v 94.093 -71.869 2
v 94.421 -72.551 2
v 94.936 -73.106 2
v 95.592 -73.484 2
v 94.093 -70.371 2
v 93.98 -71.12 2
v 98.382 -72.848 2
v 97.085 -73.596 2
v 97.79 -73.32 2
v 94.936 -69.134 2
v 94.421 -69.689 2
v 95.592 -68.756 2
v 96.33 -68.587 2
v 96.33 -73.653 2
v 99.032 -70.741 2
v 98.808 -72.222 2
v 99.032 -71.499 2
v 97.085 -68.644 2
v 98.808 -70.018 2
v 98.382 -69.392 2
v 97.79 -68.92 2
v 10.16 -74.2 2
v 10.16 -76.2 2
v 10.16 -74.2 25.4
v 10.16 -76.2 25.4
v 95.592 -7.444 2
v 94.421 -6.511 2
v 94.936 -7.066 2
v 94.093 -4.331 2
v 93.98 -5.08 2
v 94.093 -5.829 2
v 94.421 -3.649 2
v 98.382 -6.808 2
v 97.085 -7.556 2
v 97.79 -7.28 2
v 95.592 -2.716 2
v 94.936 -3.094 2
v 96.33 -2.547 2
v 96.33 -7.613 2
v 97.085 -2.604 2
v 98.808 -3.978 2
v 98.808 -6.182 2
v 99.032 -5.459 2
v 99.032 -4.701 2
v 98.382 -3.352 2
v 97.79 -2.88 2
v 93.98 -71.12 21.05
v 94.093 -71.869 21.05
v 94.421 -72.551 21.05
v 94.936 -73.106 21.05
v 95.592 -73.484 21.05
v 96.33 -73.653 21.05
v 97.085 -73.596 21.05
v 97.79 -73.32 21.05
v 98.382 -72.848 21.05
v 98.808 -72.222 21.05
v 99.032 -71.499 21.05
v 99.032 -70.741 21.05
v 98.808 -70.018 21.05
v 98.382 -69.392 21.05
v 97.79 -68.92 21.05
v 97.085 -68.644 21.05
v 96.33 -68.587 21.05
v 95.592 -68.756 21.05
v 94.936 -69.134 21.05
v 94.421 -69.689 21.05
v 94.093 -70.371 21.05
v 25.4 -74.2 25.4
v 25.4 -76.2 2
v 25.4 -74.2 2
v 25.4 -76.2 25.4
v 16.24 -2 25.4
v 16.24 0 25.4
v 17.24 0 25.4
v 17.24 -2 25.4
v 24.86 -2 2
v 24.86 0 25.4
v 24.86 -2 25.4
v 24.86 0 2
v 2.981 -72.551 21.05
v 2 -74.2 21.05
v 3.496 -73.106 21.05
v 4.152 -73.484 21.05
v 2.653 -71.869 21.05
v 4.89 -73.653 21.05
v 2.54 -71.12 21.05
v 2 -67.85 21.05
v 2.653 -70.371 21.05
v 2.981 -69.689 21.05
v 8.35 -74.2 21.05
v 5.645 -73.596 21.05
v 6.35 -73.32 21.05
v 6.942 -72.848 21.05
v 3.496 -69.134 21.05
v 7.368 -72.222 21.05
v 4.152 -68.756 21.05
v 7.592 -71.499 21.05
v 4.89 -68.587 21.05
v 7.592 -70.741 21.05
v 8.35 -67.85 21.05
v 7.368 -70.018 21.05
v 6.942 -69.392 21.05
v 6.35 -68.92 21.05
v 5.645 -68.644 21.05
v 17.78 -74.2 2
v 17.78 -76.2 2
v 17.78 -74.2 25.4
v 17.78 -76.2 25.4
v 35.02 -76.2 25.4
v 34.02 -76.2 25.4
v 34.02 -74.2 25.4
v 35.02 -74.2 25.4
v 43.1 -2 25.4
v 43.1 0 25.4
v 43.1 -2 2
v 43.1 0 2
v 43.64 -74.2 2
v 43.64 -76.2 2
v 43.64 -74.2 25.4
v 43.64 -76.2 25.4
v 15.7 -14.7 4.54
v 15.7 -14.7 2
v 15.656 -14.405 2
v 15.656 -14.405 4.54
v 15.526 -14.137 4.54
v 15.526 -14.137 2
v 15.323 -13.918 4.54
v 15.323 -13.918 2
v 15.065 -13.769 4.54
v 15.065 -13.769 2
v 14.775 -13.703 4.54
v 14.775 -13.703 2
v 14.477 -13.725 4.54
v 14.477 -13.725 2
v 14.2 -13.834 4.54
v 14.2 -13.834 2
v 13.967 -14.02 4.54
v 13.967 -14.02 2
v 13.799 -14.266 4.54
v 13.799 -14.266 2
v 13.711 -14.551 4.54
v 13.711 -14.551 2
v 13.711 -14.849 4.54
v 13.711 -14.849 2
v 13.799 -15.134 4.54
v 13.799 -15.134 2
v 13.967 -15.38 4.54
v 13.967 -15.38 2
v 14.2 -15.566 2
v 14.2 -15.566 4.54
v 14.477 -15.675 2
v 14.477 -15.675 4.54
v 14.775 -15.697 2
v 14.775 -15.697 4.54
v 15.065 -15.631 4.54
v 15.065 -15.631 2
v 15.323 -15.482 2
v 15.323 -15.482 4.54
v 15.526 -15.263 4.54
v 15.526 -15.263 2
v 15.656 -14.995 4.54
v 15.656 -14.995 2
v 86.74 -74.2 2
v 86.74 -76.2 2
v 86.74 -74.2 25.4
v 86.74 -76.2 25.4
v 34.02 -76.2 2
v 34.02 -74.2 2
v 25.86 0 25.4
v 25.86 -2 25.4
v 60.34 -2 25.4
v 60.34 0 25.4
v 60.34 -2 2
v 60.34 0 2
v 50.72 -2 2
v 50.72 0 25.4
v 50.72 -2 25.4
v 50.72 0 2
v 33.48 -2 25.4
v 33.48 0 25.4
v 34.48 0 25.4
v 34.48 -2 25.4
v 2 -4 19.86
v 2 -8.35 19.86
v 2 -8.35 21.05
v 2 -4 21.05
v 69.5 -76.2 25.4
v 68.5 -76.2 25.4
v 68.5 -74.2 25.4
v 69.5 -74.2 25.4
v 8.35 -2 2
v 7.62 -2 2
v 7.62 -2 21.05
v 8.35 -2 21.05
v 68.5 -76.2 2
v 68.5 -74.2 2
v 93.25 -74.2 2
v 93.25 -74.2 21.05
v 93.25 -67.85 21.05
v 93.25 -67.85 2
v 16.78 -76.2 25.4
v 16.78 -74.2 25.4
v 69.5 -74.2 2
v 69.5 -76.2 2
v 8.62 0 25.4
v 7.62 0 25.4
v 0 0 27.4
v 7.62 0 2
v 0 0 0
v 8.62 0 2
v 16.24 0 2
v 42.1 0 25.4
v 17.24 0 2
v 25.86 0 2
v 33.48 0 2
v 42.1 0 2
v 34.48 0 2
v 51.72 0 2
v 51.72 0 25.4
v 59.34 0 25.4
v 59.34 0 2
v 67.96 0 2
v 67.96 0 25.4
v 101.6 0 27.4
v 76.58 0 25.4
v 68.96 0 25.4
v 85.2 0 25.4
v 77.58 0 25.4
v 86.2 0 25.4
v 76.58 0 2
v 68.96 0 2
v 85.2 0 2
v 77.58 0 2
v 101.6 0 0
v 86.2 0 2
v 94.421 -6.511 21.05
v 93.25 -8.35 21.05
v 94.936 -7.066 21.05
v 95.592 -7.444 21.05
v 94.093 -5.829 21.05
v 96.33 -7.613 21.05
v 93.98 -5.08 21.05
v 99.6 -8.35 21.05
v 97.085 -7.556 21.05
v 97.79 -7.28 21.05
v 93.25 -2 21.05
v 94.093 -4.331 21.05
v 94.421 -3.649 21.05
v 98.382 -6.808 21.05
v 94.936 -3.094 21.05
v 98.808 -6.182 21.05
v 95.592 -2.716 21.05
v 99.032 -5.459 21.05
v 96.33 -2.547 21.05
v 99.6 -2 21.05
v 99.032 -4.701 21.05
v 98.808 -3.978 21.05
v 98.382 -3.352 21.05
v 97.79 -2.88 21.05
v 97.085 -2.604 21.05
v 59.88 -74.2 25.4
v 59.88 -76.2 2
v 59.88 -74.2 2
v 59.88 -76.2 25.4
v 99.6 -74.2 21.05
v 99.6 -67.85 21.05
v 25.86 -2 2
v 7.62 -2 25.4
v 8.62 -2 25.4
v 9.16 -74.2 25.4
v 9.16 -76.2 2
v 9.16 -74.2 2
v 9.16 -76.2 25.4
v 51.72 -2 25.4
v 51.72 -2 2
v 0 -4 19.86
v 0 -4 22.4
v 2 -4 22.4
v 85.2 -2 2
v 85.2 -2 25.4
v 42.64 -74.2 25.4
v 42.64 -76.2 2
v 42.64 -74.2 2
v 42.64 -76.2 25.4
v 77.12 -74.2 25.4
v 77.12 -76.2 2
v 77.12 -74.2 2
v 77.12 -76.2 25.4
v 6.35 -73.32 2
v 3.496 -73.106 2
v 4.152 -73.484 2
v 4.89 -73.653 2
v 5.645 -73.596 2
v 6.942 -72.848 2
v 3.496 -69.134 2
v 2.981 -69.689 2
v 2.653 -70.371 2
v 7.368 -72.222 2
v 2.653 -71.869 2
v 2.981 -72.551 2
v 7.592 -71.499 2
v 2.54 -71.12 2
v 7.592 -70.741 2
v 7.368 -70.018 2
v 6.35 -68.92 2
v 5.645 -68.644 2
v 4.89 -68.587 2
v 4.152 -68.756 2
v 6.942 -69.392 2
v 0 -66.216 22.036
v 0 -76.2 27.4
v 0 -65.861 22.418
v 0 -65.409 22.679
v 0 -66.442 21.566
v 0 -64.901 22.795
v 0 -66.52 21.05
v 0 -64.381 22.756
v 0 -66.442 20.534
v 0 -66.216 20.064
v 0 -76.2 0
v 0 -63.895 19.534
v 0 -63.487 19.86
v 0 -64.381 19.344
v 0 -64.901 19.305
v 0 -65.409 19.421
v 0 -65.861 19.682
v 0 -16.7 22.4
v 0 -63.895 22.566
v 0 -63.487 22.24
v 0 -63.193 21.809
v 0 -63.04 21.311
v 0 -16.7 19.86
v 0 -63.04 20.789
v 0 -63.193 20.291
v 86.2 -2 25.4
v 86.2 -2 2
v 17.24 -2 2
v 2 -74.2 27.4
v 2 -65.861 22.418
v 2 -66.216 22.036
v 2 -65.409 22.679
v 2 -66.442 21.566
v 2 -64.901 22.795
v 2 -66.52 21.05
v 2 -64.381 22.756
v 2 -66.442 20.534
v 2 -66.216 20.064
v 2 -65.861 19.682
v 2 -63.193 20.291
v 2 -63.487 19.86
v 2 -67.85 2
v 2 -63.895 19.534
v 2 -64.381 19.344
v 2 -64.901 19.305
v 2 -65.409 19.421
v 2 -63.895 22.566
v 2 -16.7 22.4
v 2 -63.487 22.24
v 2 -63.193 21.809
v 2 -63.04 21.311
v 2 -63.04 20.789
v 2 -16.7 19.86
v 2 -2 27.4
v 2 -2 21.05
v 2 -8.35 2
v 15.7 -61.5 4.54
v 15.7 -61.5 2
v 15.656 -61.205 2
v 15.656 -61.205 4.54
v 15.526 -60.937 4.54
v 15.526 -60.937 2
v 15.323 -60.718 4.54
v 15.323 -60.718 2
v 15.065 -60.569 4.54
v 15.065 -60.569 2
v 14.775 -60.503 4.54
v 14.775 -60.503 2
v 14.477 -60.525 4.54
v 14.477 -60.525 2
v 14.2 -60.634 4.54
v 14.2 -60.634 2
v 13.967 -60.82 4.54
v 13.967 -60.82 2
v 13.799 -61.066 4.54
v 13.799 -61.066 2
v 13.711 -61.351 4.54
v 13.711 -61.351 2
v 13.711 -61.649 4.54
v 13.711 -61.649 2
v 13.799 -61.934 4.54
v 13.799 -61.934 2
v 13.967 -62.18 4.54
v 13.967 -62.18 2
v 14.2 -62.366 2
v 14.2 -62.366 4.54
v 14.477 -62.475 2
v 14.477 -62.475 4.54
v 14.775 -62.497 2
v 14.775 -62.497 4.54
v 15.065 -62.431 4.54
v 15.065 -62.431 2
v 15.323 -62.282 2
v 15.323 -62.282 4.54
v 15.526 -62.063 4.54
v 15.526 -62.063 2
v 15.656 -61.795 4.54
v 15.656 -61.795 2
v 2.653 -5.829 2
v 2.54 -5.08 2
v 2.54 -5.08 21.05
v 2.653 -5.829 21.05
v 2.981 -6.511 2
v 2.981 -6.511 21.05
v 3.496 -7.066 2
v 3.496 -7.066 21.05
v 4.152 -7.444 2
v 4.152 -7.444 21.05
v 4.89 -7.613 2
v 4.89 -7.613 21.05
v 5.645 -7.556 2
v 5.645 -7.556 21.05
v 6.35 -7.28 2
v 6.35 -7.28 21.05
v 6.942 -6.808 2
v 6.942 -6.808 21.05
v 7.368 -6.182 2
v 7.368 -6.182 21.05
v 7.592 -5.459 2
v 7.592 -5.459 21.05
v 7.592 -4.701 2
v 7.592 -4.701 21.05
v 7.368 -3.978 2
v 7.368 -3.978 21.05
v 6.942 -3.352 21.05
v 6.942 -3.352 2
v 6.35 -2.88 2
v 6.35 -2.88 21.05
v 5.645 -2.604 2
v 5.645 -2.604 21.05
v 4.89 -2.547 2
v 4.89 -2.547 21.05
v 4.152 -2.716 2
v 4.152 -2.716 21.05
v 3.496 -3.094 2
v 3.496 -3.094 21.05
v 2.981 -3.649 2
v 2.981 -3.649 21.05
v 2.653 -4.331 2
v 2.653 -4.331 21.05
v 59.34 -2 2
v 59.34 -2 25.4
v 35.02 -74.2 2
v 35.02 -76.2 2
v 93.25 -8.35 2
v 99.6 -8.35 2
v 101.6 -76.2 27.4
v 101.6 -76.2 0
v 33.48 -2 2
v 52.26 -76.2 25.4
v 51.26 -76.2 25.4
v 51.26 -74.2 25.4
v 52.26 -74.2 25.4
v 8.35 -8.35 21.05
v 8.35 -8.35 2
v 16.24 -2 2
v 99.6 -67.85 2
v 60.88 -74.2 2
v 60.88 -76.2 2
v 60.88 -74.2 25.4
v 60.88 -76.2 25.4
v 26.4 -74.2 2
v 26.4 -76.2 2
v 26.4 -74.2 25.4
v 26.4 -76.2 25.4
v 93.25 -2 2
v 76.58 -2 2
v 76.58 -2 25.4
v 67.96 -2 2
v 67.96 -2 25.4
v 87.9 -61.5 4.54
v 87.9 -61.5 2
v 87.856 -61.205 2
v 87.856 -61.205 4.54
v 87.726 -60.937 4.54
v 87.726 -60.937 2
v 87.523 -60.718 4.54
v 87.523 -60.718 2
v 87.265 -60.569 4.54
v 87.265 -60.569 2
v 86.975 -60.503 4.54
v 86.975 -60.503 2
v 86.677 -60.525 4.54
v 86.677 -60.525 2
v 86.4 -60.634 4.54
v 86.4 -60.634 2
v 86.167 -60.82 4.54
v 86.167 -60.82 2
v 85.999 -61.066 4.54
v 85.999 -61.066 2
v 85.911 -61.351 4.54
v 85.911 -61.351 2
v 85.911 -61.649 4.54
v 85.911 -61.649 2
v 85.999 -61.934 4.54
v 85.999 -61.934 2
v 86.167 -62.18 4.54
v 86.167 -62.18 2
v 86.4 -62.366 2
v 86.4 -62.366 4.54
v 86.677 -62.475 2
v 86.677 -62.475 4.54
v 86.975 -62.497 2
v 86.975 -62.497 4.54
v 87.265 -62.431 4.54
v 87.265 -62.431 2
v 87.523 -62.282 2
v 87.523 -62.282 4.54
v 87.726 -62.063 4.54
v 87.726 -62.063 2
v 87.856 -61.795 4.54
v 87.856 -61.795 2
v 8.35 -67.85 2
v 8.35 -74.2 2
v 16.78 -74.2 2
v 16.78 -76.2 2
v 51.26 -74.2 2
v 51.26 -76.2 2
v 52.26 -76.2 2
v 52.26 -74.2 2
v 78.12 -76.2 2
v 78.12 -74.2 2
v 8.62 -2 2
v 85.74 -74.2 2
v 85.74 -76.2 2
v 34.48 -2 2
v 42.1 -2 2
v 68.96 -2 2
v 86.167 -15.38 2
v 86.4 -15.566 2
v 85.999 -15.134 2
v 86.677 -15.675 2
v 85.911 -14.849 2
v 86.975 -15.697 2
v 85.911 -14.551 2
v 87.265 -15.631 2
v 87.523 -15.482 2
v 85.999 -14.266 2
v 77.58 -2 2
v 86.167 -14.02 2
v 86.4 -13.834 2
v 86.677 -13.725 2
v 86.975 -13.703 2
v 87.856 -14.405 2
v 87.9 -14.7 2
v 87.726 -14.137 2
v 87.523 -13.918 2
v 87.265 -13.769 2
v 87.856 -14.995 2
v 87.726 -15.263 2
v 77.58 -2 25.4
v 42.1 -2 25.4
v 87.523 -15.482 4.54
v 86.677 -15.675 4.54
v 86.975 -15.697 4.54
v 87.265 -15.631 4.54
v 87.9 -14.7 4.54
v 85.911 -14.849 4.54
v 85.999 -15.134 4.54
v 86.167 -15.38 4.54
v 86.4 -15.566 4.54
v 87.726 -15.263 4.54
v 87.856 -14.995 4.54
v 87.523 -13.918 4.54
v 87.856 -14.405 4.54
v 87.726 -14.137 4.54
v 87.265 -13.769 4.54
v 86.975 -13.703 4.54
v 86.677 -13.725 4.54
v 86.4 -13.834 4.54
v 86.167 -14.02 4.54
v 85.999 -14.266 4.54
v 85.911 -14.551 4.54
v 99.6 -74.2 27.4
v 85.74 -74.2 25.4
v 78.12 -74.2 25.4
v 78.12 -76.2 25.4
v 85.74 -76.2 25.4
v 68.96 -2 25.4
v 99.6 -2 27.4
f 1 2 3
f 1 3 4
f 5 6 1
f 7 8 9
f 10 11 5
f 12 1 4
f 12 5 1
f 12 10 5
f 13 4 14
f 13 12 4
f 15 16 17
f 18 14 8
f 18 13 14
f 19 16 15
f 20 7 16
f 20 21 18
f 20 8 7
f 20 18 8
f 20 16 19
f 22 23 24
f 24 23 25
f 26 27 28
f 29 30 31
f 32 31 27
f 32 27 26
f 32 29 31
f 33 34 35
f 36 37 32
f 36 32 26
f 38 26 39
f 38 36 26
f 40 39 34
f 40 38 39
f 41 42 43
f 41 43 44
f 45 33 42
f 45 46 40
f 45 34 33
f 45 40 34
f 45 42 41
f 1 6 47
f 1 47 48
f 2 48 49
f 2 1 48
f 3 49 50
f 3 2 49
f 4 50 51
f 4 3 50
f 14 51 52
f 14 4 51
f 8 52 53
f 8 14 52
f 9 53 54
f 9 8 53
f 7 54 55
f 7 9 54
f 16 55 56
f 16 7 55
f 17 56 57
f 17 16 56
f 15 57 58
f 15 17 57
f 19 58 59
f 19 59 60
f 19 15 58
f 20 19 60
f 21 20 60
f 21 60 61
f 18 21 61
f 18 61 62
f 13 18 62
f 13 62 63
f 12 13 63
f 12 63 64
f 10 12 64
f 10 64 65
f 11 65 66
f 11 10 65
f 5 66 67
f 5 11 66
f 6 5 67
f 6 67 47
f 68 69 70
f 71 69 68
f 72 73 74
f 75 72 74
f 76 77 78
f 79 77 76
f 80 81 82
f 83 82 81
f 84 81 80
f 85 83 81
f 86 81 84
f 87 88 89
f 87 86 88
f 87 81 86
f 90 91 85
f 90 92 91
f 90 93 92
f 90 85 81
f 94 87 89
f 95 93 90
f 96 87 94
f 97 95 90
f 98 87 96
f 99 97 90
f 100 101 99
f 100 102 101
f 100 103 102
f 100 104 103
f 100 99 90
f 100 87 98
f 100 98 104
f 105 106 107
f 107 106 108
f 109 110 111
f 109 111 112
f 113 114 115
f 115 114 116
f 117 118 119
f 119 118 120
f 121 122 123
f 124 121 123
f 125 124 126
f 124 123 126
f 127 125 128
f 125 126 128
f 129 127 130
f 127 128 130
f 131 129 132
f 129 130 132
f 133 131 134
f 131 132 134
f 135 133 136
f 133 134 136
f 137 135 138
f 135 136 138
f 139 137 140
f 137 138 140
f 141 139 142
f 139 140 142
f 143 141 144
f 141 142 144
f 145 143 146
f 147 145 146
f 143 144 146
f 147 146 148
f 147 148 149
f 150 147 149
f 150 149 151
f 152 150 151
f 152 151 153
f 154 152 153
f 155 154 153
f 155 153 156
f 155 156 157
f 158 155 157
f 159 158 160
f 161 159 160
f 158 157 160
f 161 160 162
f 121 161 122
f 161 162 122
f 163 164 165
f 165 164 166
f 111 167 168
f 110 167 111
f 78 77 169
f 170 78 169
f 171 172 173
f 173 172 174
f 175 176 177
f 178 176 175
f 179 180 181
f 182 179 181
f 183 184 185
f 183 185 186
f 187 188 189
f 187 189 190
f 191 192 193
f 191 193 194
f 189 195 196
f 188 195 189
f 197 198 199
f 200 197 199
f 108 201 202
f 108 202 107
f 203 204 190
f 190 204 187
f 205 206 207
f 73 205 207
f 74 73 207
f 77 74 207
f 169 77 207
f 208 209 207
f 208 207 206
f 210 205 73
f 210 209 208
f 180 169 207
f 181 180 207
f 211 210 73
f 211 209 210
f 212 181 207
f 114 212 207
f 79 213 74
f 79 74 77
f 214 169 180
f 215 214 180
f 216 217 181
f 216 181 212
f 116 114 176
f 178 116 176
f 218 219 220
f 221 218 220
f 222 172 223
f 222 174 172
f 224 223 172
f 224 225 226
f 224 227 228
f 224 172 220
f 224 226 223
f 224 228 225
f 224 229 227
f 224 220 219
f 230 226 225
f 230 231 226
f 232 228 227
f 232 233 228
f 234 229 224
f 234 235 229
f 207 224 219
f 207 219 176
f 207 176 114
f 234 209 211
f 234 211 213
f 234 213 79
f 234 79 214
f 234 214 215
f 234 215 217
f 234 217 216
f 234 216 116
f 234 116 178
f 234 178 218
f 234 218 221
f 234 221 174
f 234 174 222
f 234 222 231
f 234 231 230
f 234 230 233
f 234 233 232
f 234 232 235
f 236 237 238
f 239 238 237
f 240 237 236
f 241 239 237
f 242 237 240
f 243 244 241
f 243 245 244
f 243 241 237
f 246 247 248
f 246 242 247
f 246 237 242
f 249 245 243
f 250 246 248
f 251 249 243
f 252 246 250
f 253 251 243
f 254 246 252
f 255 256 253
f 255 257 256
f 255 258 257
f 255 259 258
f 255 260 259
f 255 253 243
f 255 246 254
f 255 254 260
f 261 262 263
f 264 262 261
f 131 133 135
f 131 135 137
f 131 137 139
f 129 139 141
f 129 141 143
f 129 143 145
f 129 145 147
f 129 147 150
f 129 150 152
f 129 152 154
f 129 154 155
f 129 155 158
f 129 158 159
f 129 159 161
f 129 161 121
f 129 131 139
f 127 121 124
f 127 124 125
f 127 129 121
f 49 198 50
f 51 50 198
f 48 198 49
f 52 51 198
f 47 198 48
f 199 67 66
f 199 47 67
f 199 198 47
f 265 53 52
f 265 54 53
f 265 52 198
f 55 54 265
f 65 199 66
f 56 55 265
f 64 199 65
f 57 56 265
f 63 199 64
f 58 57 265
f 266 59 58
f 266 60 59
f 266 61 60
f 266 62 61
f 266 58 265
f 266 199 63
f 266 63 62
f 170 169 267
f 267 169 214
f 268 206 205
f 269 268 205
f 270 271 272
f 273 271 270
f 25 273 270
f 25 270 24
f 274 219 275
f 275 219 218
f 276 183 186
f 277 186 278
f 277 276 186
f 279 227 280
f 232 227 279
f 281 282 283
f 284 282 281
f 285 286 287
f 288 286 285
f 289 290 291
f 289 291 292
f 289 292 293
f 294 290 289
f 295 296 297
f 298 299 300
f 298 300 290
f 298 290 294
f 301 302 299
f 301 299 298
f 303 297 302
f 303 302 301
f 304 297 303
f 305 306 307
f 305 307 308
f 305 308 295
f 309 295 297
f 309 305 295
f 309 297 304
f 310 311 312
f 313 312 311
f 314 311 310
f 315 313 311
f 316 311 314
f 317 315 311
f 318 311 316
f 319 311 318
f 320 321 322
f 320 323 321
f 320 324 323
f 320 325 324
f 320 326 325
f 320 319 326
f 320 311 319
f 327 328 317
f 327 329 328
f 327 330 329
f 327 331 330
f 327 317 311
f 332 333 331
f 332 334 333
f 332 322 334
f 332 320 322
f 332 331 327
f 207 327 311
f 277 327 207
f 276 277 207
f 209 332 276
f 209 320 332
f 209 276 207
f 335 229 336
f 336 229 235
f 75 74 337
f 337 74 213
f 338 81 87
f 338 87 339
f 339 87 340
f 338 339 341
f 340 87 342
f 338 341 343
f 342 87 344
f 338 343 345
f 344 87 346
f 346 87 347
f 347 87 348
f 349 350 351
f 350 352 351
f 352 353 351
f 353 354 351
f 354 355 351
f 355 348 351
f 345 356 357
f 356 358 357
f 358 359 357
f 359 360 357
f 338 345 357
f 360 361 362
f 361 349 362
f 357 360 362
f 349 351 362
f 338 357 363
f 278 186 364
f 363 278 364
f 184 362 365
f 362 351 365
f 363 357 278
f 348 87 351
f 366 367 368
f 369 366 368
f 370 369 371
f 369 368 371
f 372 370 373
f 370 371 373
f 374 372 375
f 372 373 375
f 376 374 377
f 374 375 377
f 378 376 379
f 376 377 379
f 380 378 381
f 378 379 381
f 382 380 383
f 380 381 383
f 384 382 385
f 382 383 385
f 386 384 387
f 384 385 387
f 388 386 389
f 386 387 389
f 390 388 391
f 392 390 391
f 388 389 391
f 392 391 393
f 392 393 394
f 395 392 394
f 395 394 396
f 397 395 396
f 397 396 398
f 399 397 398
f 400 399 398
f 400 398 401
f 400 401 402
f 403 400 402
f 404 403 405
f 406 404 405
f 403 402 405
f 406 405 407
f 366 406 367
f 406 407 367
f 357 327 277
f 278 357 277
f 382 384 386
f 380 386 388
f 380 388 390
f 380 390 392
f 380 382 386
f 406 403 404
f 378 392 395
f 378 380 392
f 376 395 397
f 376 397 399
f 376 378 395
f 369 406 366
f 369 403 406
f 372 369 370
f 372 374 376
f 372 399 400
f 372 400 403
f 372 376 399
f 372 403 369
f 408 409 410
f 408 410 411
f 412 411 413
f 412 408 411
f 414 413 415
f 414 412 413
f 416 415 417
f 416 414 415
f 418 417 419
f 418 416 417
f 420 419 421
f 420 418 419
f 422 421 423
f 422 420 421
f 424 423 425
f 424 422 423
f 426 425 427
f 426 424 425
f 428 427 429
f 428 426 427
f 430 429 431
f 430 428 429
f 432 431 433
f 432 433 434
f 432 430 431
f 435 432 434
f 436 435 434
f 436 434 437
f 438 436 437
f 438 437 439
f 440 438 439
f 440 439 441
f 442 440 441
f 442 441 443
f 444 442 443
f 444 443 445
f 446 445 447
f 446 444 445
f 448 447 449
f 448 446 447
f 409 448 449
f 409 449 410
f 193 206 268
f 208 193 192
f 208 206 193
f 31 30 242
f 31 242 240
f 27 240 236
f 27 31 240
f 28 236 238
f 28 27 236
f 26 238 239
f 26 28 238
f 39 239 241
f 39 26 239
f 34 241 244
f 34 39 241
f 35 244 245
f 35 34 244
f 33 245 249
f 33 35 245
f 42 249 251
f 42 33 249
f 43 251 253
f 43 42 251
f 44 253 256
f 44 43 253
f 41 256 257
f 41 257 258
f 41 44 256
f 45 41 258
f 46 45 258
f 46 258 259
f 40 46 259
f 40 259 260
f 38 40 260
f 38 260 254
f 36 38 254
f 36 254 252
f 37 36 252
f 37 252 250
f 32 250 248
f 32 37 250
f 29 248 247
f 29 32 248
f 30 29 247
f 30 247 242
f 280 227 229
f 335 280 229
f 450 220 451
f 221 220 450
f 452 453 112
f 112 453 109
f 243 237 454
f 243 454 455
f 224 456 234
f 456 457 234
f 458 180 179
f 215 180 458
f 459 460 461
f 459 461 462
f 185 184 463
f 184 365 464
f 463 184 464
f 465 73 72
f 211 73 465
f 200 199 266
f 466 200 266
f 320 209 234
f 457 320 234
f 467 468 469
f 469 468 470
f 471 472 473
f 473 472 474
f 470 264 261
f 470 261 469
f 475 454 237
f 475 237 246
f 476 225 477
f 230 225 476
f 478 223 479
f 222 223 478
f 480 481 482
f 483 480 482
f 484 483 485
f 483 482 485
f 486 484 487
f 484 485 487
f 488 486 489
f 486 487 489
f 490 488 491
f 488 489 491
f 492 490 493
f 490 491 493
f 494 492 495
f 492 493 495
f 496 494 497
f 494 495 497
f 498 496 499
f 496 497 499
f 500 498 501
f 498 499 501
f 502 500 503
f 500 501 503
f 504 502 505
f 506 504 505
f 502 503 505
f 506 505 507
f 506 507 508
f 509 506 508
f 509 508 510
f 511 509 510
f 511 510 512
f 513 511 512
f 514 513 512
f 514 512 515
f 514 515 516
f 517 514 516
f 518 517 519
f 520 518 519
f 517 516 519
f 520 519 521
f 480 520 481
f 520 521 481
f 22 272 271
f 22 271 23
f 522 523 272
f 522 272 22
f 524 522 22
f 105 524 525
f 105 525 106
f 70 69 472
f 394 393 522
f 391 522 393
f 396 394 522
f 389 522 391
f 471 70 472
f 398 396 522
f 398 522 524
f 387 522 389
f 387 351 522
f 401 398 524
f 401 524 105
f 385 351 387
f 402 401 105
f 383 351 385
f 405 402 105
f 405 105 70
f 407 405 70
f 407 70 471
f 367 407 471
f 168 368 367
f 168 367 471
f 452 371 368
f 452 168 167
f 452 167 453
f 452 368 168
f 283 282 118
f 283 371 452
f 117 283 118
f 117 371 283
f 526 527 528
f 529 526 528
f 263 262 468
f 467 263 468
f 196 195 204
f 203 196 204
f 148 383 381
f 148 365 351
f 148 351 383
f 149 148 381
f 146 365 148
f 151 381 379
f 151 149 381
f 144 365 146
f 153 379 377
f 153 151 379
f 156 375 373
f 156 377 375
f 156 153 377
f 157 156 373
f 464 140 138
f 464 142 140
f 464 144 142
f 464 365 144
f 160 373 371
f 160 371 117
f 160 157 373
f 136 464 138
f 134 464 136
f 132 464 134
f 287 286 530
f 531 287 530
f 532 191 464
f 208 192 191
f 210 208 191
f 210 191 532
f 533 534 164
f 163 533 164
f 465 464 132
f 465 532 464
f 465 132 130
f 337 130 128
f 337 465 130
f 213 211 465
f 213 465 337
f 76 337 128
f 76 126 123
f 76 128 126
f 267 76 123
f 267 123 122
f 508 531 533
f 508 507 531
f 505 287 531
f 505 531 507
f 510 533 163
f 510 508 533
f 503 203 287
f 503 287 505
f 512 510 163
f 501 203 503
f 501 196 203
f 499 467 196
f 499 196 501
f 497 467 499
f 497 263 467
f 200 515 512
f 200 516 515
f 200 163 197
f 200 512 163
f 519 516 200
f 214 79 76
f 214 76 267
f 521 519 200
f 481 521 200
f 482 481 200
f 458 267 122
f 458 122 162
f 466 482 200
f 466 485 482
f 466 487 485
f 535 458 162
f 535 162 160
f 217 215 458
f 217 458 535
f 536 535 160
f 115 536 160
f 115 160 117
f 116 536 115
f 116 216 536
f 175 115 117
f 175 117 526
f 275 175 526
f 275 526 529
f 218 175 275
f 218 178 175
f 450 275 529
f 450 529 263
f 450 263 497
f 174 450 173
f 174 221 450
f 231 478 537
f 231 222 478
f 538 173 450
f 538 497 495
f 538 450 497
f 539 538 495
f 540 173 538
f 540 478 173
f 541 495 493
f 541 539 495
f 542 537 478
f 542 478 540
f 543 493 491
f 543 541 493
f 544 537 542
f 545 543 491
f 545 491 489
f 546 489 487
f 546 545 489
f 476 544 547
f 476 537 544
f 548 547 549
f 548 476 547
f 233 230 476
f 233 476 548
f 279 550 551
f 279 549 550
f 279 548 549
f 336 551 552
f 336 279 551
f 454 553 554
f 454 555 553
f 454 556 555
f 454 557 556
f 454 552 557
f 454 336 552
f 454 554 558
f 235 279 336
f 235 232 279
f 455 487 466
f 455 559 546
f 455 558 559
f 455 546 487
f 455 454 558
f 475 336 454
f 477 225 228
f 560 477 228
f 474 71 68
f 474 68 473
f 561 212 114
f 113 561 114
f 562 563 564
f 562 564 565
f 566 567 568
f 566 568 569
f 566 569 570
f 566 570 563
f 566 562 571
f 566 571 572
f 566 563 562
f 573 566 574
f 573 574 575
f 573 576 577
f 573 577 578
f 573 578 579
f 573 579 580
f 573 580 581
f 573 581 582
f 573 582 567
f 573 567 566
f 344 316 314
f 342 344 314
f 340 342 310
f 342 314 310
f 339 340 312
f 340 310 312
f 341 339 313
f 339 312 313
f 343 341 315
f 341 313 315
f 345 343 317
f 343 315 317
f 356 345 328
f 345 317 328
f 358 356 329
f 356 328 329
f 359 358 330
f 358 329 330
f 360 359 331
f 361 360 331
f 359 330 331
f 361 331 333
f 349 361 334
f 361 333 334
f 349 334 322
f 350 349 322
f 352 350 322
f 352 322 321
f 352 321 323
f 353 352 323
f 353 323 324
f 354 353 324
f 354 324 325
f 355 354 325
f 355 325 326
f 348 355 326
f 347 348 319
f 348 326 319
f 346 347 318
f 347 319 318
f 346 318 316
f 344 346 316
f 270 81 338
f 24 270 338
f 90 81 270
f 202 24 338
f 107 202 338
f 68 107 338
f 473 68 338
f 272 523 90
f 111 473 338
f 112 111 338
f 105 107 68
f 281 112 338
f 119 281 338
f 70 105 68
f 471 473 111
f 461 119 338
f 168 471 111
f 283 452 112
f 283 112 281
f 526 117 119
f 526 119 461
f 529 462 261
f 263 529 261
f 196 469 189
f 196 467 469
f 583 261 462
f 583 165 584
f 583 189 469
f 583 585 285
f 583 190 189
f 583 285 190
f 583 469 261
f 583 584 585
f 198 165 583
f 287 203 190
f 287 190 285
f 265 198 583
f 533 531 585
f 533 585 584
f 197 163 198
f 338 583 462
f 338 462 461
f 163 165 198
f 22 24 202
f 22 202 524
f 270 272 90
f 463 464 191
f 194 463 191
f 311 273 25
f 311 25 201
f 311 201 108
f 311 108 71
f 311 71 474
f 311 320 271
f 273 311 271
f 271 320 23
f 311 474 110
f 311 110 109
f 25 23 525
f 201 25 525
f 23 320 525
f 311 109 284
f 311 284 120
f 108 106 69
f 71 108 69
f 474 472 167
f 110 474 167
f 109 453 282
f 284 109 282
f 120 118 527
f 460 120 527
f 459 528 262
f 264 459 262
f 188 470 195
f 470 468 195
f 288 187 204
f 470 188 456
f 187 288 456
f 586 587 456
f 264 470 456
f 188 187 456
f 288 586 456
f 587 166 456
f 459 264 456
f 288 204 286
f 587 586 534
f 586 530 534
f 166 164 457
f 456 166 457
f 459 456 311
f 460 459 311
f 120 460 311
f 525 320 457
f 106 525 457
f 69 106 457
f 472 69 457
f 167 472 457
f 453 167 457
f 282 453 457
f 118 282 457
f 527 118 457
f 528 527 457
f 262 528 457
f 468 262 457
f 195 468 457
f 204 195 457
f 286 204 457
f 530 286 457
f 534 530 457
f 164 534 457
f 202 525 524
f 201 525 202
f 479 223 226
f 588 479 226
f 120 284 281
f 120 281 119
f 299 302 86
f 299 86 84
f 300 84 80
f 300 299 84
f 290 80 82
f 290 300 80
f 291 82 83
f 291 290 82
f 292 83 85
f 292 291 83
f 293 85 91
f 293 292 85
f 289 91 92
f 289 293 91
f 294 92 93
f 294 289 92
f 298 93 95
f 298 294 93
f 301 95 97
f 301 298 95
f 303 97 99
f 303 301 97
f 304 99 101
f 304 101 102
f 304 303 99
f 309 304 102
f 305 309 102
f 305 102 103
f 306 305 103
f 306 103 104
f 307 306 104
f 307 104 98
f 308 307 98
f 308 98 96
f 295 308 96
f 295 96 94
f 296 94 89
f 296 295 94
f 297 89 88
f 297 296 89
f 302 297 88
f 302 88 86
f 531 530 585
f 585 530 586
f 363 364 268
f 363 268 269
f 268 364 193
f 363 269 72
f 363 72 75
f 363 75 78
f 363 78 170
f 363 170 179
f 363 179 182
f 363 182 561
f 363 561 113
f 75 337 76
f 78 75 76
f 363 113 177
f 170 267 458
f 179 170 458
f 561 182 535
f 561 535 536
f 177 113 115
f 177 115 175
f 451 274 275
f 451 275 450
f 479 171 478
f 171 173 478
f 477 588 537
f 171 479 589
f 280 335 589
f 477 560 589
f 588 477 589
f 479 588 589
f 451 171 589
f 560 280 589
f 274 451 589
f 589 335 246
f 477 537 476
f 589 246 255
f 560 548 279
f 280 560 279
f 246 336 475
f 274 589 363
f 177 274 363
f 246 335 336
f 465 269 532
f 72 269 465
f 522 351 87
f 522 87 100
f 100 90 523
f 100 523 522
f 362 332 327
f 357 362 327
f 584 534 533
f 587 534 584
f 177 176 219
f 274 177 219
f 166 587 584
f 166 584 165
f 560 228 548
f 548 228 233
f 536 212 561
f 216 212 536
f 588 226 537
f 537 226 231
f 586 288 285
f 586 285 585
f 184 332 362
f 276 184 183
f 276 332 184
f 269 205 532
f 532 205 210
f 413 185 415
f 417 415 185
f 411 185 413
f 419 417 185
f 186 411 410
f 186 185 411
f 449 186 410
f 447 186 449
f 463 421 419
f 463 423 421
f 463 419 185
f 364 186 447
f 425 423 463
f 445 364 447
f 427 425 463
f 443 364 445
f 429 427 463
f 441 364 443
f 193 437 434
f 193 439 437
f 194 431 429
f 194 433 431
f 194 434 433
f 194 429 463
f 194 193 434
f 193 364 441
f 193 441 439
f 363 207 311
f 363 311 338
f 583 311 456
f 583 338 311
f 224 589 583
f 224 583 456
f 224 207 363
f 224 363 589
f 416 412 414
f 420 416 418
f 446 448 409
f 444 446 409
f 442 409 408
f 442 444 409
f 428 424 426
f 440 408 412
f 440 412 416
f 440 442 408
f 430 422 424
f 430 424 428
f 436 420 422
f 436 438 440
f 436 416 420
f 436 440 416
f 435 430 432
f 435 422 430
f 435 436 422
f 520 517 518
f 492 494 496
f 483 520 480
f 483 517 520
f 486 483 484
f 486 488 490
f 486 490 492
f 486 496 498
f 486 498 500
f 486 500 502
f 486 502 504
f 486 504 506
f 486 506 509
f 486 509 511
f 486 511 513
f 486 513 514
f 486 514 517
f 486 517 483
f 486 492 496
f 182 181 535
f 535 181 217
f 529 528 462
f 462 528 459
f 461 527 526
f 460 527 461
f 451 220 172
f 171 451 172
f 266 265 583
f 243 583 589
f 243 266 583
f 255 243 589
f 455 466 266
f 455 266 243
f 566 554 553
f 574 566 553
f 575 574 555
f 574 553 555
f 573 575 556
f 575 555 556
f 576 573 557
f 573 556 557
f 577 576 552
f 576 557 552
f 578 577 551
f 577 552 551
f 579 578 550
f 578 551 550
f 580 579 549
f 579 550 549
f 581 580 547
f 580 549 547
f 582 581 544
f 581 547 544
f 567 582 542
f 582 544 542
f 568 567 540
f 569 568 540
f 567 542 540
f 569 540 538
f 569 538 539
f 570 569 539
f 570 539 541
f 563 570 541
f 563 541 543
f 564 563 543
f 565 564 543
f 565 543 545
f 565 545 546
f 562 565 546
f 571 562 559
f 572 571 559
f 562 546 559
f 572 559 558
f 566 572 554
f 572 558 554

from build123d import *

# Parameters (mm, degrees)
SKETCH16_W          = 101.6
SKETCH16_H          = 76.2
BOSS_EXTRUDE4_DEPTH = 2
SKETCH17_W          = 101.6
SKETCH17_H          = 76.2
SKETCH17_W_2        = 97.6
SKETCH17_H_2        = 72.2
BOSS_EXTRUDE5_DEPTH = 25.4
SKETCH18_R          = 1
BOSS_EXTRUDE6_DEPTH = 2.54
SKETCH19_W          = 1
SKETCH19_H          = 23.4
CUT_EXTRUDE6_DEPTH  = 2
SKETCH20_W          = 1
SKETCH20_H          = 23.4
CUT_EXTRUDE7_DEPTH  = 2
SKETCH21_R          = 1.75
SKETCH21_W          = 2.54
SKETCH21_H          = 12.7
CUT_EXTRUDE8_DEPTH  = 2
SKETCH33_W          = 6.35
SKETCH33_H          = 6.35
SKETCH33_R          = 2.54
BOSS_EXTRUDE7_DEPTH = 19.05


with BuildPart() as part:
    # Sketch16 → Boss-Extrude4 (new body)
    with BuildSketch(Plane.XY):
        with Locations((50.8, -38.1)):
            Rectangle(SKETCH16_W, SKETCH16_H)
    extrude(amount=BOSS_EXTRUDE4_DEPTH)

    # Sketch17 → Boss-Extrude5 (add)
    with BuildSketch(Plane.XY.offset(2)):
        with Locations((50.8, -38.1)):
            Rectangle(SKETCH17_W, SKETCH17_H)
        with Locations((50.8, -38.1)):
            Rectangle(SKETCH17_W_2, SKETCH17_H_2, mode=Mode.SUBTRACT)
    extrude(amount=BOSS_EXTRUDE5_DEPTH)

    # Sketch18 → Boss-Extrude6 (add)
    with BuildSketch(Plane.XY.offset(2)):
        with Locations((14.7, -14.7)):
            Circle(SKETCH18_R)
        with Locations((86.9, -14.7)):
            Circle(SKETCH18_R)
        with Locations((86.9, -61.5)):
            Circle(SKETCH18_R)
        with Locations((14.7, -61.5)):
            Circle(SKETCH18_R)
    extrude(amount=BOSS_EXTRUDE6_DEPTH)

    # Sketch19 → Cut-Extrude6 (cut)
    with BuildSketch(Plane.XZ.offset(76.2)):
        with Locations((9.66, 13.7)):
            Rectangle(SKETCH19_W, SKETCH19_H)
        with Locations((17.28, 13.7)):
            Rectangle(SKETCH19_W, SKETCH19_H)
        with Locations((25.9, 13.7)):
            Rectangle(SKETCH19_W, SKETCH19_H)
        with Locations((34.52, 13.7)):
            Rectangle(SKETCH19_W, SKETCH19_H)
        with Locations((43.14, 13.7)):
            Rectangle(SKETCH19_W, SKETCH19_H)
        with Locations((51.76, 13.7)):
            Rectangle(SKETCH19_W, SKETCH19_H)
        with Locations((60.38, 13.7)):
            Rectangle(SKETCH19_W, SKETCH19_H)
        with Locations((69, 13.7)):
            Rectangle(SKETCH19_W, SKETCH19_H)
        with Locations((77.62, 13.7)):
            Rectangle(SKETCH19_W, SKETCH19_H)
        with Locations((86.24, 13.7)):
            Rectangle(SKETCH19_W, SKETCH19_H)
    extrude(amount=-CUT_EXTRUDE6_DEPTH, mode=Mode.SUBTRACT)

    # Sketch20 → Cut-Extrude7 (cut)
    with BuildSketch(Plane(origin=(0, 0, 0), x_dir=(1, 0, 0), z_dir=(0, 1, 0))):
        with Locations((8.12, -13.7)):
            Rectangle(SKETCH20_W, SKETCH20_H)
        with Locations((16.74, -13.7)):
            Rectangle(SKETCH20_W, SKETCH20_H)
        with Locations((25.36, -13.7)):
            Rectangle(SKETCH20_W, SKETCH20_H)
        with Locations((33.98, -13.7)):
            Rectangle(SKETCH20_W, SKETCH20_H)
        with Locations((42.6, -13.7)):
            Rectangle(SKETCH20_W, SKETCH20_H)
        with Locations((51.22, -13.7)):
            Rectangle(SKETCH20_W, SKETCH20_H)
        with Locations((59.84, -13.7)):
            Rectangle(SKETCH20_W, SKETCH20_H)
        with Locations((68.46, -13.7)):
            Rectangle(SKETCH20_W, SKETCH20_H)
        with Locations((85.7, -13.7)):
            Rectangle(SKETCH20_W, SKETCH20_H)
        with Locations((77.08, -13.7)):
            Rectangle(SKETCH20_W, SKETCH20_H)
    extrude(amount=-CUT_EXTRUDE7_DEPTH, mode=Mode.SUBTRACT)

    # Sketch21 → Cut-Extrude8 (cut)
    with BuildSketch(Plane.ZY):
        with Locations(Location((21.05, -64.77, 0), (0, 0, 270))):
            Circle(SKETCH21_R)
        with Locations((21.13, -10.35)):
            Rectangle(SKETCH21_W, SKETCH21_H)
    extrude(amount=-CUT_EXTRUDE8_DEPTH, mode=Mode.SUBTRACT)

    # Sketch33 → Boss-Extrude7 (add)
    # profile 1 of 4: a face of its own
    with BuildSketch(Plane.XY.offset(2)):
        with Locations((5.175, -5.175)):
            Rectangle(SKETCH33_W, SKETCH33_H)
        with Locations(Location((5.08, -5.08, 0), (0, 0, 180))):
            Circle(SKETCH33_R, mode=Mode.SUBTRACT)
    # profile 2 of 4: a face of its own
    with BuildSketch(Plane.XY.offset(2)):
        with Locations((96.425, -5.175)):
            Rectangle(SKETCH33_W, SKETCH33_H)
        with Locations(Location((96.52, -5.08, 0), (0, 0, 180))):
            Circle(SKETCH33_R, mode=Mode.SUBTRACT)
    # profile 3 of 4: a face of its own
    with BuildSketch(Plane.XY.offset(2)):
        with Locations((5.175, -71.025)):
            Rectangle(SKETCH33_W, SKETCH33_H)
        with Locations(Location((5.08, -71.12, 0), (0, 0, 180))):
            Circle(SKETCH33_R, mode=Mode.SUBTRACT)
    # profile 4 of 4: a face of its own
    with BuildSketch(Plane.XY.offset(2)):
        with Locations((96.425, -71.025)):
            Rectangle(SKETCH33_W, SKETCH33_H)
        with Locations(Location((96.52, -71.12, 0), (0, 0, 180))):
            Circle(SKETCH33_R, mode=Mode.SUBTRACT)
    extrude(amount=BOSS_EXTRUDE7_DEPTH)


solid = part.part
